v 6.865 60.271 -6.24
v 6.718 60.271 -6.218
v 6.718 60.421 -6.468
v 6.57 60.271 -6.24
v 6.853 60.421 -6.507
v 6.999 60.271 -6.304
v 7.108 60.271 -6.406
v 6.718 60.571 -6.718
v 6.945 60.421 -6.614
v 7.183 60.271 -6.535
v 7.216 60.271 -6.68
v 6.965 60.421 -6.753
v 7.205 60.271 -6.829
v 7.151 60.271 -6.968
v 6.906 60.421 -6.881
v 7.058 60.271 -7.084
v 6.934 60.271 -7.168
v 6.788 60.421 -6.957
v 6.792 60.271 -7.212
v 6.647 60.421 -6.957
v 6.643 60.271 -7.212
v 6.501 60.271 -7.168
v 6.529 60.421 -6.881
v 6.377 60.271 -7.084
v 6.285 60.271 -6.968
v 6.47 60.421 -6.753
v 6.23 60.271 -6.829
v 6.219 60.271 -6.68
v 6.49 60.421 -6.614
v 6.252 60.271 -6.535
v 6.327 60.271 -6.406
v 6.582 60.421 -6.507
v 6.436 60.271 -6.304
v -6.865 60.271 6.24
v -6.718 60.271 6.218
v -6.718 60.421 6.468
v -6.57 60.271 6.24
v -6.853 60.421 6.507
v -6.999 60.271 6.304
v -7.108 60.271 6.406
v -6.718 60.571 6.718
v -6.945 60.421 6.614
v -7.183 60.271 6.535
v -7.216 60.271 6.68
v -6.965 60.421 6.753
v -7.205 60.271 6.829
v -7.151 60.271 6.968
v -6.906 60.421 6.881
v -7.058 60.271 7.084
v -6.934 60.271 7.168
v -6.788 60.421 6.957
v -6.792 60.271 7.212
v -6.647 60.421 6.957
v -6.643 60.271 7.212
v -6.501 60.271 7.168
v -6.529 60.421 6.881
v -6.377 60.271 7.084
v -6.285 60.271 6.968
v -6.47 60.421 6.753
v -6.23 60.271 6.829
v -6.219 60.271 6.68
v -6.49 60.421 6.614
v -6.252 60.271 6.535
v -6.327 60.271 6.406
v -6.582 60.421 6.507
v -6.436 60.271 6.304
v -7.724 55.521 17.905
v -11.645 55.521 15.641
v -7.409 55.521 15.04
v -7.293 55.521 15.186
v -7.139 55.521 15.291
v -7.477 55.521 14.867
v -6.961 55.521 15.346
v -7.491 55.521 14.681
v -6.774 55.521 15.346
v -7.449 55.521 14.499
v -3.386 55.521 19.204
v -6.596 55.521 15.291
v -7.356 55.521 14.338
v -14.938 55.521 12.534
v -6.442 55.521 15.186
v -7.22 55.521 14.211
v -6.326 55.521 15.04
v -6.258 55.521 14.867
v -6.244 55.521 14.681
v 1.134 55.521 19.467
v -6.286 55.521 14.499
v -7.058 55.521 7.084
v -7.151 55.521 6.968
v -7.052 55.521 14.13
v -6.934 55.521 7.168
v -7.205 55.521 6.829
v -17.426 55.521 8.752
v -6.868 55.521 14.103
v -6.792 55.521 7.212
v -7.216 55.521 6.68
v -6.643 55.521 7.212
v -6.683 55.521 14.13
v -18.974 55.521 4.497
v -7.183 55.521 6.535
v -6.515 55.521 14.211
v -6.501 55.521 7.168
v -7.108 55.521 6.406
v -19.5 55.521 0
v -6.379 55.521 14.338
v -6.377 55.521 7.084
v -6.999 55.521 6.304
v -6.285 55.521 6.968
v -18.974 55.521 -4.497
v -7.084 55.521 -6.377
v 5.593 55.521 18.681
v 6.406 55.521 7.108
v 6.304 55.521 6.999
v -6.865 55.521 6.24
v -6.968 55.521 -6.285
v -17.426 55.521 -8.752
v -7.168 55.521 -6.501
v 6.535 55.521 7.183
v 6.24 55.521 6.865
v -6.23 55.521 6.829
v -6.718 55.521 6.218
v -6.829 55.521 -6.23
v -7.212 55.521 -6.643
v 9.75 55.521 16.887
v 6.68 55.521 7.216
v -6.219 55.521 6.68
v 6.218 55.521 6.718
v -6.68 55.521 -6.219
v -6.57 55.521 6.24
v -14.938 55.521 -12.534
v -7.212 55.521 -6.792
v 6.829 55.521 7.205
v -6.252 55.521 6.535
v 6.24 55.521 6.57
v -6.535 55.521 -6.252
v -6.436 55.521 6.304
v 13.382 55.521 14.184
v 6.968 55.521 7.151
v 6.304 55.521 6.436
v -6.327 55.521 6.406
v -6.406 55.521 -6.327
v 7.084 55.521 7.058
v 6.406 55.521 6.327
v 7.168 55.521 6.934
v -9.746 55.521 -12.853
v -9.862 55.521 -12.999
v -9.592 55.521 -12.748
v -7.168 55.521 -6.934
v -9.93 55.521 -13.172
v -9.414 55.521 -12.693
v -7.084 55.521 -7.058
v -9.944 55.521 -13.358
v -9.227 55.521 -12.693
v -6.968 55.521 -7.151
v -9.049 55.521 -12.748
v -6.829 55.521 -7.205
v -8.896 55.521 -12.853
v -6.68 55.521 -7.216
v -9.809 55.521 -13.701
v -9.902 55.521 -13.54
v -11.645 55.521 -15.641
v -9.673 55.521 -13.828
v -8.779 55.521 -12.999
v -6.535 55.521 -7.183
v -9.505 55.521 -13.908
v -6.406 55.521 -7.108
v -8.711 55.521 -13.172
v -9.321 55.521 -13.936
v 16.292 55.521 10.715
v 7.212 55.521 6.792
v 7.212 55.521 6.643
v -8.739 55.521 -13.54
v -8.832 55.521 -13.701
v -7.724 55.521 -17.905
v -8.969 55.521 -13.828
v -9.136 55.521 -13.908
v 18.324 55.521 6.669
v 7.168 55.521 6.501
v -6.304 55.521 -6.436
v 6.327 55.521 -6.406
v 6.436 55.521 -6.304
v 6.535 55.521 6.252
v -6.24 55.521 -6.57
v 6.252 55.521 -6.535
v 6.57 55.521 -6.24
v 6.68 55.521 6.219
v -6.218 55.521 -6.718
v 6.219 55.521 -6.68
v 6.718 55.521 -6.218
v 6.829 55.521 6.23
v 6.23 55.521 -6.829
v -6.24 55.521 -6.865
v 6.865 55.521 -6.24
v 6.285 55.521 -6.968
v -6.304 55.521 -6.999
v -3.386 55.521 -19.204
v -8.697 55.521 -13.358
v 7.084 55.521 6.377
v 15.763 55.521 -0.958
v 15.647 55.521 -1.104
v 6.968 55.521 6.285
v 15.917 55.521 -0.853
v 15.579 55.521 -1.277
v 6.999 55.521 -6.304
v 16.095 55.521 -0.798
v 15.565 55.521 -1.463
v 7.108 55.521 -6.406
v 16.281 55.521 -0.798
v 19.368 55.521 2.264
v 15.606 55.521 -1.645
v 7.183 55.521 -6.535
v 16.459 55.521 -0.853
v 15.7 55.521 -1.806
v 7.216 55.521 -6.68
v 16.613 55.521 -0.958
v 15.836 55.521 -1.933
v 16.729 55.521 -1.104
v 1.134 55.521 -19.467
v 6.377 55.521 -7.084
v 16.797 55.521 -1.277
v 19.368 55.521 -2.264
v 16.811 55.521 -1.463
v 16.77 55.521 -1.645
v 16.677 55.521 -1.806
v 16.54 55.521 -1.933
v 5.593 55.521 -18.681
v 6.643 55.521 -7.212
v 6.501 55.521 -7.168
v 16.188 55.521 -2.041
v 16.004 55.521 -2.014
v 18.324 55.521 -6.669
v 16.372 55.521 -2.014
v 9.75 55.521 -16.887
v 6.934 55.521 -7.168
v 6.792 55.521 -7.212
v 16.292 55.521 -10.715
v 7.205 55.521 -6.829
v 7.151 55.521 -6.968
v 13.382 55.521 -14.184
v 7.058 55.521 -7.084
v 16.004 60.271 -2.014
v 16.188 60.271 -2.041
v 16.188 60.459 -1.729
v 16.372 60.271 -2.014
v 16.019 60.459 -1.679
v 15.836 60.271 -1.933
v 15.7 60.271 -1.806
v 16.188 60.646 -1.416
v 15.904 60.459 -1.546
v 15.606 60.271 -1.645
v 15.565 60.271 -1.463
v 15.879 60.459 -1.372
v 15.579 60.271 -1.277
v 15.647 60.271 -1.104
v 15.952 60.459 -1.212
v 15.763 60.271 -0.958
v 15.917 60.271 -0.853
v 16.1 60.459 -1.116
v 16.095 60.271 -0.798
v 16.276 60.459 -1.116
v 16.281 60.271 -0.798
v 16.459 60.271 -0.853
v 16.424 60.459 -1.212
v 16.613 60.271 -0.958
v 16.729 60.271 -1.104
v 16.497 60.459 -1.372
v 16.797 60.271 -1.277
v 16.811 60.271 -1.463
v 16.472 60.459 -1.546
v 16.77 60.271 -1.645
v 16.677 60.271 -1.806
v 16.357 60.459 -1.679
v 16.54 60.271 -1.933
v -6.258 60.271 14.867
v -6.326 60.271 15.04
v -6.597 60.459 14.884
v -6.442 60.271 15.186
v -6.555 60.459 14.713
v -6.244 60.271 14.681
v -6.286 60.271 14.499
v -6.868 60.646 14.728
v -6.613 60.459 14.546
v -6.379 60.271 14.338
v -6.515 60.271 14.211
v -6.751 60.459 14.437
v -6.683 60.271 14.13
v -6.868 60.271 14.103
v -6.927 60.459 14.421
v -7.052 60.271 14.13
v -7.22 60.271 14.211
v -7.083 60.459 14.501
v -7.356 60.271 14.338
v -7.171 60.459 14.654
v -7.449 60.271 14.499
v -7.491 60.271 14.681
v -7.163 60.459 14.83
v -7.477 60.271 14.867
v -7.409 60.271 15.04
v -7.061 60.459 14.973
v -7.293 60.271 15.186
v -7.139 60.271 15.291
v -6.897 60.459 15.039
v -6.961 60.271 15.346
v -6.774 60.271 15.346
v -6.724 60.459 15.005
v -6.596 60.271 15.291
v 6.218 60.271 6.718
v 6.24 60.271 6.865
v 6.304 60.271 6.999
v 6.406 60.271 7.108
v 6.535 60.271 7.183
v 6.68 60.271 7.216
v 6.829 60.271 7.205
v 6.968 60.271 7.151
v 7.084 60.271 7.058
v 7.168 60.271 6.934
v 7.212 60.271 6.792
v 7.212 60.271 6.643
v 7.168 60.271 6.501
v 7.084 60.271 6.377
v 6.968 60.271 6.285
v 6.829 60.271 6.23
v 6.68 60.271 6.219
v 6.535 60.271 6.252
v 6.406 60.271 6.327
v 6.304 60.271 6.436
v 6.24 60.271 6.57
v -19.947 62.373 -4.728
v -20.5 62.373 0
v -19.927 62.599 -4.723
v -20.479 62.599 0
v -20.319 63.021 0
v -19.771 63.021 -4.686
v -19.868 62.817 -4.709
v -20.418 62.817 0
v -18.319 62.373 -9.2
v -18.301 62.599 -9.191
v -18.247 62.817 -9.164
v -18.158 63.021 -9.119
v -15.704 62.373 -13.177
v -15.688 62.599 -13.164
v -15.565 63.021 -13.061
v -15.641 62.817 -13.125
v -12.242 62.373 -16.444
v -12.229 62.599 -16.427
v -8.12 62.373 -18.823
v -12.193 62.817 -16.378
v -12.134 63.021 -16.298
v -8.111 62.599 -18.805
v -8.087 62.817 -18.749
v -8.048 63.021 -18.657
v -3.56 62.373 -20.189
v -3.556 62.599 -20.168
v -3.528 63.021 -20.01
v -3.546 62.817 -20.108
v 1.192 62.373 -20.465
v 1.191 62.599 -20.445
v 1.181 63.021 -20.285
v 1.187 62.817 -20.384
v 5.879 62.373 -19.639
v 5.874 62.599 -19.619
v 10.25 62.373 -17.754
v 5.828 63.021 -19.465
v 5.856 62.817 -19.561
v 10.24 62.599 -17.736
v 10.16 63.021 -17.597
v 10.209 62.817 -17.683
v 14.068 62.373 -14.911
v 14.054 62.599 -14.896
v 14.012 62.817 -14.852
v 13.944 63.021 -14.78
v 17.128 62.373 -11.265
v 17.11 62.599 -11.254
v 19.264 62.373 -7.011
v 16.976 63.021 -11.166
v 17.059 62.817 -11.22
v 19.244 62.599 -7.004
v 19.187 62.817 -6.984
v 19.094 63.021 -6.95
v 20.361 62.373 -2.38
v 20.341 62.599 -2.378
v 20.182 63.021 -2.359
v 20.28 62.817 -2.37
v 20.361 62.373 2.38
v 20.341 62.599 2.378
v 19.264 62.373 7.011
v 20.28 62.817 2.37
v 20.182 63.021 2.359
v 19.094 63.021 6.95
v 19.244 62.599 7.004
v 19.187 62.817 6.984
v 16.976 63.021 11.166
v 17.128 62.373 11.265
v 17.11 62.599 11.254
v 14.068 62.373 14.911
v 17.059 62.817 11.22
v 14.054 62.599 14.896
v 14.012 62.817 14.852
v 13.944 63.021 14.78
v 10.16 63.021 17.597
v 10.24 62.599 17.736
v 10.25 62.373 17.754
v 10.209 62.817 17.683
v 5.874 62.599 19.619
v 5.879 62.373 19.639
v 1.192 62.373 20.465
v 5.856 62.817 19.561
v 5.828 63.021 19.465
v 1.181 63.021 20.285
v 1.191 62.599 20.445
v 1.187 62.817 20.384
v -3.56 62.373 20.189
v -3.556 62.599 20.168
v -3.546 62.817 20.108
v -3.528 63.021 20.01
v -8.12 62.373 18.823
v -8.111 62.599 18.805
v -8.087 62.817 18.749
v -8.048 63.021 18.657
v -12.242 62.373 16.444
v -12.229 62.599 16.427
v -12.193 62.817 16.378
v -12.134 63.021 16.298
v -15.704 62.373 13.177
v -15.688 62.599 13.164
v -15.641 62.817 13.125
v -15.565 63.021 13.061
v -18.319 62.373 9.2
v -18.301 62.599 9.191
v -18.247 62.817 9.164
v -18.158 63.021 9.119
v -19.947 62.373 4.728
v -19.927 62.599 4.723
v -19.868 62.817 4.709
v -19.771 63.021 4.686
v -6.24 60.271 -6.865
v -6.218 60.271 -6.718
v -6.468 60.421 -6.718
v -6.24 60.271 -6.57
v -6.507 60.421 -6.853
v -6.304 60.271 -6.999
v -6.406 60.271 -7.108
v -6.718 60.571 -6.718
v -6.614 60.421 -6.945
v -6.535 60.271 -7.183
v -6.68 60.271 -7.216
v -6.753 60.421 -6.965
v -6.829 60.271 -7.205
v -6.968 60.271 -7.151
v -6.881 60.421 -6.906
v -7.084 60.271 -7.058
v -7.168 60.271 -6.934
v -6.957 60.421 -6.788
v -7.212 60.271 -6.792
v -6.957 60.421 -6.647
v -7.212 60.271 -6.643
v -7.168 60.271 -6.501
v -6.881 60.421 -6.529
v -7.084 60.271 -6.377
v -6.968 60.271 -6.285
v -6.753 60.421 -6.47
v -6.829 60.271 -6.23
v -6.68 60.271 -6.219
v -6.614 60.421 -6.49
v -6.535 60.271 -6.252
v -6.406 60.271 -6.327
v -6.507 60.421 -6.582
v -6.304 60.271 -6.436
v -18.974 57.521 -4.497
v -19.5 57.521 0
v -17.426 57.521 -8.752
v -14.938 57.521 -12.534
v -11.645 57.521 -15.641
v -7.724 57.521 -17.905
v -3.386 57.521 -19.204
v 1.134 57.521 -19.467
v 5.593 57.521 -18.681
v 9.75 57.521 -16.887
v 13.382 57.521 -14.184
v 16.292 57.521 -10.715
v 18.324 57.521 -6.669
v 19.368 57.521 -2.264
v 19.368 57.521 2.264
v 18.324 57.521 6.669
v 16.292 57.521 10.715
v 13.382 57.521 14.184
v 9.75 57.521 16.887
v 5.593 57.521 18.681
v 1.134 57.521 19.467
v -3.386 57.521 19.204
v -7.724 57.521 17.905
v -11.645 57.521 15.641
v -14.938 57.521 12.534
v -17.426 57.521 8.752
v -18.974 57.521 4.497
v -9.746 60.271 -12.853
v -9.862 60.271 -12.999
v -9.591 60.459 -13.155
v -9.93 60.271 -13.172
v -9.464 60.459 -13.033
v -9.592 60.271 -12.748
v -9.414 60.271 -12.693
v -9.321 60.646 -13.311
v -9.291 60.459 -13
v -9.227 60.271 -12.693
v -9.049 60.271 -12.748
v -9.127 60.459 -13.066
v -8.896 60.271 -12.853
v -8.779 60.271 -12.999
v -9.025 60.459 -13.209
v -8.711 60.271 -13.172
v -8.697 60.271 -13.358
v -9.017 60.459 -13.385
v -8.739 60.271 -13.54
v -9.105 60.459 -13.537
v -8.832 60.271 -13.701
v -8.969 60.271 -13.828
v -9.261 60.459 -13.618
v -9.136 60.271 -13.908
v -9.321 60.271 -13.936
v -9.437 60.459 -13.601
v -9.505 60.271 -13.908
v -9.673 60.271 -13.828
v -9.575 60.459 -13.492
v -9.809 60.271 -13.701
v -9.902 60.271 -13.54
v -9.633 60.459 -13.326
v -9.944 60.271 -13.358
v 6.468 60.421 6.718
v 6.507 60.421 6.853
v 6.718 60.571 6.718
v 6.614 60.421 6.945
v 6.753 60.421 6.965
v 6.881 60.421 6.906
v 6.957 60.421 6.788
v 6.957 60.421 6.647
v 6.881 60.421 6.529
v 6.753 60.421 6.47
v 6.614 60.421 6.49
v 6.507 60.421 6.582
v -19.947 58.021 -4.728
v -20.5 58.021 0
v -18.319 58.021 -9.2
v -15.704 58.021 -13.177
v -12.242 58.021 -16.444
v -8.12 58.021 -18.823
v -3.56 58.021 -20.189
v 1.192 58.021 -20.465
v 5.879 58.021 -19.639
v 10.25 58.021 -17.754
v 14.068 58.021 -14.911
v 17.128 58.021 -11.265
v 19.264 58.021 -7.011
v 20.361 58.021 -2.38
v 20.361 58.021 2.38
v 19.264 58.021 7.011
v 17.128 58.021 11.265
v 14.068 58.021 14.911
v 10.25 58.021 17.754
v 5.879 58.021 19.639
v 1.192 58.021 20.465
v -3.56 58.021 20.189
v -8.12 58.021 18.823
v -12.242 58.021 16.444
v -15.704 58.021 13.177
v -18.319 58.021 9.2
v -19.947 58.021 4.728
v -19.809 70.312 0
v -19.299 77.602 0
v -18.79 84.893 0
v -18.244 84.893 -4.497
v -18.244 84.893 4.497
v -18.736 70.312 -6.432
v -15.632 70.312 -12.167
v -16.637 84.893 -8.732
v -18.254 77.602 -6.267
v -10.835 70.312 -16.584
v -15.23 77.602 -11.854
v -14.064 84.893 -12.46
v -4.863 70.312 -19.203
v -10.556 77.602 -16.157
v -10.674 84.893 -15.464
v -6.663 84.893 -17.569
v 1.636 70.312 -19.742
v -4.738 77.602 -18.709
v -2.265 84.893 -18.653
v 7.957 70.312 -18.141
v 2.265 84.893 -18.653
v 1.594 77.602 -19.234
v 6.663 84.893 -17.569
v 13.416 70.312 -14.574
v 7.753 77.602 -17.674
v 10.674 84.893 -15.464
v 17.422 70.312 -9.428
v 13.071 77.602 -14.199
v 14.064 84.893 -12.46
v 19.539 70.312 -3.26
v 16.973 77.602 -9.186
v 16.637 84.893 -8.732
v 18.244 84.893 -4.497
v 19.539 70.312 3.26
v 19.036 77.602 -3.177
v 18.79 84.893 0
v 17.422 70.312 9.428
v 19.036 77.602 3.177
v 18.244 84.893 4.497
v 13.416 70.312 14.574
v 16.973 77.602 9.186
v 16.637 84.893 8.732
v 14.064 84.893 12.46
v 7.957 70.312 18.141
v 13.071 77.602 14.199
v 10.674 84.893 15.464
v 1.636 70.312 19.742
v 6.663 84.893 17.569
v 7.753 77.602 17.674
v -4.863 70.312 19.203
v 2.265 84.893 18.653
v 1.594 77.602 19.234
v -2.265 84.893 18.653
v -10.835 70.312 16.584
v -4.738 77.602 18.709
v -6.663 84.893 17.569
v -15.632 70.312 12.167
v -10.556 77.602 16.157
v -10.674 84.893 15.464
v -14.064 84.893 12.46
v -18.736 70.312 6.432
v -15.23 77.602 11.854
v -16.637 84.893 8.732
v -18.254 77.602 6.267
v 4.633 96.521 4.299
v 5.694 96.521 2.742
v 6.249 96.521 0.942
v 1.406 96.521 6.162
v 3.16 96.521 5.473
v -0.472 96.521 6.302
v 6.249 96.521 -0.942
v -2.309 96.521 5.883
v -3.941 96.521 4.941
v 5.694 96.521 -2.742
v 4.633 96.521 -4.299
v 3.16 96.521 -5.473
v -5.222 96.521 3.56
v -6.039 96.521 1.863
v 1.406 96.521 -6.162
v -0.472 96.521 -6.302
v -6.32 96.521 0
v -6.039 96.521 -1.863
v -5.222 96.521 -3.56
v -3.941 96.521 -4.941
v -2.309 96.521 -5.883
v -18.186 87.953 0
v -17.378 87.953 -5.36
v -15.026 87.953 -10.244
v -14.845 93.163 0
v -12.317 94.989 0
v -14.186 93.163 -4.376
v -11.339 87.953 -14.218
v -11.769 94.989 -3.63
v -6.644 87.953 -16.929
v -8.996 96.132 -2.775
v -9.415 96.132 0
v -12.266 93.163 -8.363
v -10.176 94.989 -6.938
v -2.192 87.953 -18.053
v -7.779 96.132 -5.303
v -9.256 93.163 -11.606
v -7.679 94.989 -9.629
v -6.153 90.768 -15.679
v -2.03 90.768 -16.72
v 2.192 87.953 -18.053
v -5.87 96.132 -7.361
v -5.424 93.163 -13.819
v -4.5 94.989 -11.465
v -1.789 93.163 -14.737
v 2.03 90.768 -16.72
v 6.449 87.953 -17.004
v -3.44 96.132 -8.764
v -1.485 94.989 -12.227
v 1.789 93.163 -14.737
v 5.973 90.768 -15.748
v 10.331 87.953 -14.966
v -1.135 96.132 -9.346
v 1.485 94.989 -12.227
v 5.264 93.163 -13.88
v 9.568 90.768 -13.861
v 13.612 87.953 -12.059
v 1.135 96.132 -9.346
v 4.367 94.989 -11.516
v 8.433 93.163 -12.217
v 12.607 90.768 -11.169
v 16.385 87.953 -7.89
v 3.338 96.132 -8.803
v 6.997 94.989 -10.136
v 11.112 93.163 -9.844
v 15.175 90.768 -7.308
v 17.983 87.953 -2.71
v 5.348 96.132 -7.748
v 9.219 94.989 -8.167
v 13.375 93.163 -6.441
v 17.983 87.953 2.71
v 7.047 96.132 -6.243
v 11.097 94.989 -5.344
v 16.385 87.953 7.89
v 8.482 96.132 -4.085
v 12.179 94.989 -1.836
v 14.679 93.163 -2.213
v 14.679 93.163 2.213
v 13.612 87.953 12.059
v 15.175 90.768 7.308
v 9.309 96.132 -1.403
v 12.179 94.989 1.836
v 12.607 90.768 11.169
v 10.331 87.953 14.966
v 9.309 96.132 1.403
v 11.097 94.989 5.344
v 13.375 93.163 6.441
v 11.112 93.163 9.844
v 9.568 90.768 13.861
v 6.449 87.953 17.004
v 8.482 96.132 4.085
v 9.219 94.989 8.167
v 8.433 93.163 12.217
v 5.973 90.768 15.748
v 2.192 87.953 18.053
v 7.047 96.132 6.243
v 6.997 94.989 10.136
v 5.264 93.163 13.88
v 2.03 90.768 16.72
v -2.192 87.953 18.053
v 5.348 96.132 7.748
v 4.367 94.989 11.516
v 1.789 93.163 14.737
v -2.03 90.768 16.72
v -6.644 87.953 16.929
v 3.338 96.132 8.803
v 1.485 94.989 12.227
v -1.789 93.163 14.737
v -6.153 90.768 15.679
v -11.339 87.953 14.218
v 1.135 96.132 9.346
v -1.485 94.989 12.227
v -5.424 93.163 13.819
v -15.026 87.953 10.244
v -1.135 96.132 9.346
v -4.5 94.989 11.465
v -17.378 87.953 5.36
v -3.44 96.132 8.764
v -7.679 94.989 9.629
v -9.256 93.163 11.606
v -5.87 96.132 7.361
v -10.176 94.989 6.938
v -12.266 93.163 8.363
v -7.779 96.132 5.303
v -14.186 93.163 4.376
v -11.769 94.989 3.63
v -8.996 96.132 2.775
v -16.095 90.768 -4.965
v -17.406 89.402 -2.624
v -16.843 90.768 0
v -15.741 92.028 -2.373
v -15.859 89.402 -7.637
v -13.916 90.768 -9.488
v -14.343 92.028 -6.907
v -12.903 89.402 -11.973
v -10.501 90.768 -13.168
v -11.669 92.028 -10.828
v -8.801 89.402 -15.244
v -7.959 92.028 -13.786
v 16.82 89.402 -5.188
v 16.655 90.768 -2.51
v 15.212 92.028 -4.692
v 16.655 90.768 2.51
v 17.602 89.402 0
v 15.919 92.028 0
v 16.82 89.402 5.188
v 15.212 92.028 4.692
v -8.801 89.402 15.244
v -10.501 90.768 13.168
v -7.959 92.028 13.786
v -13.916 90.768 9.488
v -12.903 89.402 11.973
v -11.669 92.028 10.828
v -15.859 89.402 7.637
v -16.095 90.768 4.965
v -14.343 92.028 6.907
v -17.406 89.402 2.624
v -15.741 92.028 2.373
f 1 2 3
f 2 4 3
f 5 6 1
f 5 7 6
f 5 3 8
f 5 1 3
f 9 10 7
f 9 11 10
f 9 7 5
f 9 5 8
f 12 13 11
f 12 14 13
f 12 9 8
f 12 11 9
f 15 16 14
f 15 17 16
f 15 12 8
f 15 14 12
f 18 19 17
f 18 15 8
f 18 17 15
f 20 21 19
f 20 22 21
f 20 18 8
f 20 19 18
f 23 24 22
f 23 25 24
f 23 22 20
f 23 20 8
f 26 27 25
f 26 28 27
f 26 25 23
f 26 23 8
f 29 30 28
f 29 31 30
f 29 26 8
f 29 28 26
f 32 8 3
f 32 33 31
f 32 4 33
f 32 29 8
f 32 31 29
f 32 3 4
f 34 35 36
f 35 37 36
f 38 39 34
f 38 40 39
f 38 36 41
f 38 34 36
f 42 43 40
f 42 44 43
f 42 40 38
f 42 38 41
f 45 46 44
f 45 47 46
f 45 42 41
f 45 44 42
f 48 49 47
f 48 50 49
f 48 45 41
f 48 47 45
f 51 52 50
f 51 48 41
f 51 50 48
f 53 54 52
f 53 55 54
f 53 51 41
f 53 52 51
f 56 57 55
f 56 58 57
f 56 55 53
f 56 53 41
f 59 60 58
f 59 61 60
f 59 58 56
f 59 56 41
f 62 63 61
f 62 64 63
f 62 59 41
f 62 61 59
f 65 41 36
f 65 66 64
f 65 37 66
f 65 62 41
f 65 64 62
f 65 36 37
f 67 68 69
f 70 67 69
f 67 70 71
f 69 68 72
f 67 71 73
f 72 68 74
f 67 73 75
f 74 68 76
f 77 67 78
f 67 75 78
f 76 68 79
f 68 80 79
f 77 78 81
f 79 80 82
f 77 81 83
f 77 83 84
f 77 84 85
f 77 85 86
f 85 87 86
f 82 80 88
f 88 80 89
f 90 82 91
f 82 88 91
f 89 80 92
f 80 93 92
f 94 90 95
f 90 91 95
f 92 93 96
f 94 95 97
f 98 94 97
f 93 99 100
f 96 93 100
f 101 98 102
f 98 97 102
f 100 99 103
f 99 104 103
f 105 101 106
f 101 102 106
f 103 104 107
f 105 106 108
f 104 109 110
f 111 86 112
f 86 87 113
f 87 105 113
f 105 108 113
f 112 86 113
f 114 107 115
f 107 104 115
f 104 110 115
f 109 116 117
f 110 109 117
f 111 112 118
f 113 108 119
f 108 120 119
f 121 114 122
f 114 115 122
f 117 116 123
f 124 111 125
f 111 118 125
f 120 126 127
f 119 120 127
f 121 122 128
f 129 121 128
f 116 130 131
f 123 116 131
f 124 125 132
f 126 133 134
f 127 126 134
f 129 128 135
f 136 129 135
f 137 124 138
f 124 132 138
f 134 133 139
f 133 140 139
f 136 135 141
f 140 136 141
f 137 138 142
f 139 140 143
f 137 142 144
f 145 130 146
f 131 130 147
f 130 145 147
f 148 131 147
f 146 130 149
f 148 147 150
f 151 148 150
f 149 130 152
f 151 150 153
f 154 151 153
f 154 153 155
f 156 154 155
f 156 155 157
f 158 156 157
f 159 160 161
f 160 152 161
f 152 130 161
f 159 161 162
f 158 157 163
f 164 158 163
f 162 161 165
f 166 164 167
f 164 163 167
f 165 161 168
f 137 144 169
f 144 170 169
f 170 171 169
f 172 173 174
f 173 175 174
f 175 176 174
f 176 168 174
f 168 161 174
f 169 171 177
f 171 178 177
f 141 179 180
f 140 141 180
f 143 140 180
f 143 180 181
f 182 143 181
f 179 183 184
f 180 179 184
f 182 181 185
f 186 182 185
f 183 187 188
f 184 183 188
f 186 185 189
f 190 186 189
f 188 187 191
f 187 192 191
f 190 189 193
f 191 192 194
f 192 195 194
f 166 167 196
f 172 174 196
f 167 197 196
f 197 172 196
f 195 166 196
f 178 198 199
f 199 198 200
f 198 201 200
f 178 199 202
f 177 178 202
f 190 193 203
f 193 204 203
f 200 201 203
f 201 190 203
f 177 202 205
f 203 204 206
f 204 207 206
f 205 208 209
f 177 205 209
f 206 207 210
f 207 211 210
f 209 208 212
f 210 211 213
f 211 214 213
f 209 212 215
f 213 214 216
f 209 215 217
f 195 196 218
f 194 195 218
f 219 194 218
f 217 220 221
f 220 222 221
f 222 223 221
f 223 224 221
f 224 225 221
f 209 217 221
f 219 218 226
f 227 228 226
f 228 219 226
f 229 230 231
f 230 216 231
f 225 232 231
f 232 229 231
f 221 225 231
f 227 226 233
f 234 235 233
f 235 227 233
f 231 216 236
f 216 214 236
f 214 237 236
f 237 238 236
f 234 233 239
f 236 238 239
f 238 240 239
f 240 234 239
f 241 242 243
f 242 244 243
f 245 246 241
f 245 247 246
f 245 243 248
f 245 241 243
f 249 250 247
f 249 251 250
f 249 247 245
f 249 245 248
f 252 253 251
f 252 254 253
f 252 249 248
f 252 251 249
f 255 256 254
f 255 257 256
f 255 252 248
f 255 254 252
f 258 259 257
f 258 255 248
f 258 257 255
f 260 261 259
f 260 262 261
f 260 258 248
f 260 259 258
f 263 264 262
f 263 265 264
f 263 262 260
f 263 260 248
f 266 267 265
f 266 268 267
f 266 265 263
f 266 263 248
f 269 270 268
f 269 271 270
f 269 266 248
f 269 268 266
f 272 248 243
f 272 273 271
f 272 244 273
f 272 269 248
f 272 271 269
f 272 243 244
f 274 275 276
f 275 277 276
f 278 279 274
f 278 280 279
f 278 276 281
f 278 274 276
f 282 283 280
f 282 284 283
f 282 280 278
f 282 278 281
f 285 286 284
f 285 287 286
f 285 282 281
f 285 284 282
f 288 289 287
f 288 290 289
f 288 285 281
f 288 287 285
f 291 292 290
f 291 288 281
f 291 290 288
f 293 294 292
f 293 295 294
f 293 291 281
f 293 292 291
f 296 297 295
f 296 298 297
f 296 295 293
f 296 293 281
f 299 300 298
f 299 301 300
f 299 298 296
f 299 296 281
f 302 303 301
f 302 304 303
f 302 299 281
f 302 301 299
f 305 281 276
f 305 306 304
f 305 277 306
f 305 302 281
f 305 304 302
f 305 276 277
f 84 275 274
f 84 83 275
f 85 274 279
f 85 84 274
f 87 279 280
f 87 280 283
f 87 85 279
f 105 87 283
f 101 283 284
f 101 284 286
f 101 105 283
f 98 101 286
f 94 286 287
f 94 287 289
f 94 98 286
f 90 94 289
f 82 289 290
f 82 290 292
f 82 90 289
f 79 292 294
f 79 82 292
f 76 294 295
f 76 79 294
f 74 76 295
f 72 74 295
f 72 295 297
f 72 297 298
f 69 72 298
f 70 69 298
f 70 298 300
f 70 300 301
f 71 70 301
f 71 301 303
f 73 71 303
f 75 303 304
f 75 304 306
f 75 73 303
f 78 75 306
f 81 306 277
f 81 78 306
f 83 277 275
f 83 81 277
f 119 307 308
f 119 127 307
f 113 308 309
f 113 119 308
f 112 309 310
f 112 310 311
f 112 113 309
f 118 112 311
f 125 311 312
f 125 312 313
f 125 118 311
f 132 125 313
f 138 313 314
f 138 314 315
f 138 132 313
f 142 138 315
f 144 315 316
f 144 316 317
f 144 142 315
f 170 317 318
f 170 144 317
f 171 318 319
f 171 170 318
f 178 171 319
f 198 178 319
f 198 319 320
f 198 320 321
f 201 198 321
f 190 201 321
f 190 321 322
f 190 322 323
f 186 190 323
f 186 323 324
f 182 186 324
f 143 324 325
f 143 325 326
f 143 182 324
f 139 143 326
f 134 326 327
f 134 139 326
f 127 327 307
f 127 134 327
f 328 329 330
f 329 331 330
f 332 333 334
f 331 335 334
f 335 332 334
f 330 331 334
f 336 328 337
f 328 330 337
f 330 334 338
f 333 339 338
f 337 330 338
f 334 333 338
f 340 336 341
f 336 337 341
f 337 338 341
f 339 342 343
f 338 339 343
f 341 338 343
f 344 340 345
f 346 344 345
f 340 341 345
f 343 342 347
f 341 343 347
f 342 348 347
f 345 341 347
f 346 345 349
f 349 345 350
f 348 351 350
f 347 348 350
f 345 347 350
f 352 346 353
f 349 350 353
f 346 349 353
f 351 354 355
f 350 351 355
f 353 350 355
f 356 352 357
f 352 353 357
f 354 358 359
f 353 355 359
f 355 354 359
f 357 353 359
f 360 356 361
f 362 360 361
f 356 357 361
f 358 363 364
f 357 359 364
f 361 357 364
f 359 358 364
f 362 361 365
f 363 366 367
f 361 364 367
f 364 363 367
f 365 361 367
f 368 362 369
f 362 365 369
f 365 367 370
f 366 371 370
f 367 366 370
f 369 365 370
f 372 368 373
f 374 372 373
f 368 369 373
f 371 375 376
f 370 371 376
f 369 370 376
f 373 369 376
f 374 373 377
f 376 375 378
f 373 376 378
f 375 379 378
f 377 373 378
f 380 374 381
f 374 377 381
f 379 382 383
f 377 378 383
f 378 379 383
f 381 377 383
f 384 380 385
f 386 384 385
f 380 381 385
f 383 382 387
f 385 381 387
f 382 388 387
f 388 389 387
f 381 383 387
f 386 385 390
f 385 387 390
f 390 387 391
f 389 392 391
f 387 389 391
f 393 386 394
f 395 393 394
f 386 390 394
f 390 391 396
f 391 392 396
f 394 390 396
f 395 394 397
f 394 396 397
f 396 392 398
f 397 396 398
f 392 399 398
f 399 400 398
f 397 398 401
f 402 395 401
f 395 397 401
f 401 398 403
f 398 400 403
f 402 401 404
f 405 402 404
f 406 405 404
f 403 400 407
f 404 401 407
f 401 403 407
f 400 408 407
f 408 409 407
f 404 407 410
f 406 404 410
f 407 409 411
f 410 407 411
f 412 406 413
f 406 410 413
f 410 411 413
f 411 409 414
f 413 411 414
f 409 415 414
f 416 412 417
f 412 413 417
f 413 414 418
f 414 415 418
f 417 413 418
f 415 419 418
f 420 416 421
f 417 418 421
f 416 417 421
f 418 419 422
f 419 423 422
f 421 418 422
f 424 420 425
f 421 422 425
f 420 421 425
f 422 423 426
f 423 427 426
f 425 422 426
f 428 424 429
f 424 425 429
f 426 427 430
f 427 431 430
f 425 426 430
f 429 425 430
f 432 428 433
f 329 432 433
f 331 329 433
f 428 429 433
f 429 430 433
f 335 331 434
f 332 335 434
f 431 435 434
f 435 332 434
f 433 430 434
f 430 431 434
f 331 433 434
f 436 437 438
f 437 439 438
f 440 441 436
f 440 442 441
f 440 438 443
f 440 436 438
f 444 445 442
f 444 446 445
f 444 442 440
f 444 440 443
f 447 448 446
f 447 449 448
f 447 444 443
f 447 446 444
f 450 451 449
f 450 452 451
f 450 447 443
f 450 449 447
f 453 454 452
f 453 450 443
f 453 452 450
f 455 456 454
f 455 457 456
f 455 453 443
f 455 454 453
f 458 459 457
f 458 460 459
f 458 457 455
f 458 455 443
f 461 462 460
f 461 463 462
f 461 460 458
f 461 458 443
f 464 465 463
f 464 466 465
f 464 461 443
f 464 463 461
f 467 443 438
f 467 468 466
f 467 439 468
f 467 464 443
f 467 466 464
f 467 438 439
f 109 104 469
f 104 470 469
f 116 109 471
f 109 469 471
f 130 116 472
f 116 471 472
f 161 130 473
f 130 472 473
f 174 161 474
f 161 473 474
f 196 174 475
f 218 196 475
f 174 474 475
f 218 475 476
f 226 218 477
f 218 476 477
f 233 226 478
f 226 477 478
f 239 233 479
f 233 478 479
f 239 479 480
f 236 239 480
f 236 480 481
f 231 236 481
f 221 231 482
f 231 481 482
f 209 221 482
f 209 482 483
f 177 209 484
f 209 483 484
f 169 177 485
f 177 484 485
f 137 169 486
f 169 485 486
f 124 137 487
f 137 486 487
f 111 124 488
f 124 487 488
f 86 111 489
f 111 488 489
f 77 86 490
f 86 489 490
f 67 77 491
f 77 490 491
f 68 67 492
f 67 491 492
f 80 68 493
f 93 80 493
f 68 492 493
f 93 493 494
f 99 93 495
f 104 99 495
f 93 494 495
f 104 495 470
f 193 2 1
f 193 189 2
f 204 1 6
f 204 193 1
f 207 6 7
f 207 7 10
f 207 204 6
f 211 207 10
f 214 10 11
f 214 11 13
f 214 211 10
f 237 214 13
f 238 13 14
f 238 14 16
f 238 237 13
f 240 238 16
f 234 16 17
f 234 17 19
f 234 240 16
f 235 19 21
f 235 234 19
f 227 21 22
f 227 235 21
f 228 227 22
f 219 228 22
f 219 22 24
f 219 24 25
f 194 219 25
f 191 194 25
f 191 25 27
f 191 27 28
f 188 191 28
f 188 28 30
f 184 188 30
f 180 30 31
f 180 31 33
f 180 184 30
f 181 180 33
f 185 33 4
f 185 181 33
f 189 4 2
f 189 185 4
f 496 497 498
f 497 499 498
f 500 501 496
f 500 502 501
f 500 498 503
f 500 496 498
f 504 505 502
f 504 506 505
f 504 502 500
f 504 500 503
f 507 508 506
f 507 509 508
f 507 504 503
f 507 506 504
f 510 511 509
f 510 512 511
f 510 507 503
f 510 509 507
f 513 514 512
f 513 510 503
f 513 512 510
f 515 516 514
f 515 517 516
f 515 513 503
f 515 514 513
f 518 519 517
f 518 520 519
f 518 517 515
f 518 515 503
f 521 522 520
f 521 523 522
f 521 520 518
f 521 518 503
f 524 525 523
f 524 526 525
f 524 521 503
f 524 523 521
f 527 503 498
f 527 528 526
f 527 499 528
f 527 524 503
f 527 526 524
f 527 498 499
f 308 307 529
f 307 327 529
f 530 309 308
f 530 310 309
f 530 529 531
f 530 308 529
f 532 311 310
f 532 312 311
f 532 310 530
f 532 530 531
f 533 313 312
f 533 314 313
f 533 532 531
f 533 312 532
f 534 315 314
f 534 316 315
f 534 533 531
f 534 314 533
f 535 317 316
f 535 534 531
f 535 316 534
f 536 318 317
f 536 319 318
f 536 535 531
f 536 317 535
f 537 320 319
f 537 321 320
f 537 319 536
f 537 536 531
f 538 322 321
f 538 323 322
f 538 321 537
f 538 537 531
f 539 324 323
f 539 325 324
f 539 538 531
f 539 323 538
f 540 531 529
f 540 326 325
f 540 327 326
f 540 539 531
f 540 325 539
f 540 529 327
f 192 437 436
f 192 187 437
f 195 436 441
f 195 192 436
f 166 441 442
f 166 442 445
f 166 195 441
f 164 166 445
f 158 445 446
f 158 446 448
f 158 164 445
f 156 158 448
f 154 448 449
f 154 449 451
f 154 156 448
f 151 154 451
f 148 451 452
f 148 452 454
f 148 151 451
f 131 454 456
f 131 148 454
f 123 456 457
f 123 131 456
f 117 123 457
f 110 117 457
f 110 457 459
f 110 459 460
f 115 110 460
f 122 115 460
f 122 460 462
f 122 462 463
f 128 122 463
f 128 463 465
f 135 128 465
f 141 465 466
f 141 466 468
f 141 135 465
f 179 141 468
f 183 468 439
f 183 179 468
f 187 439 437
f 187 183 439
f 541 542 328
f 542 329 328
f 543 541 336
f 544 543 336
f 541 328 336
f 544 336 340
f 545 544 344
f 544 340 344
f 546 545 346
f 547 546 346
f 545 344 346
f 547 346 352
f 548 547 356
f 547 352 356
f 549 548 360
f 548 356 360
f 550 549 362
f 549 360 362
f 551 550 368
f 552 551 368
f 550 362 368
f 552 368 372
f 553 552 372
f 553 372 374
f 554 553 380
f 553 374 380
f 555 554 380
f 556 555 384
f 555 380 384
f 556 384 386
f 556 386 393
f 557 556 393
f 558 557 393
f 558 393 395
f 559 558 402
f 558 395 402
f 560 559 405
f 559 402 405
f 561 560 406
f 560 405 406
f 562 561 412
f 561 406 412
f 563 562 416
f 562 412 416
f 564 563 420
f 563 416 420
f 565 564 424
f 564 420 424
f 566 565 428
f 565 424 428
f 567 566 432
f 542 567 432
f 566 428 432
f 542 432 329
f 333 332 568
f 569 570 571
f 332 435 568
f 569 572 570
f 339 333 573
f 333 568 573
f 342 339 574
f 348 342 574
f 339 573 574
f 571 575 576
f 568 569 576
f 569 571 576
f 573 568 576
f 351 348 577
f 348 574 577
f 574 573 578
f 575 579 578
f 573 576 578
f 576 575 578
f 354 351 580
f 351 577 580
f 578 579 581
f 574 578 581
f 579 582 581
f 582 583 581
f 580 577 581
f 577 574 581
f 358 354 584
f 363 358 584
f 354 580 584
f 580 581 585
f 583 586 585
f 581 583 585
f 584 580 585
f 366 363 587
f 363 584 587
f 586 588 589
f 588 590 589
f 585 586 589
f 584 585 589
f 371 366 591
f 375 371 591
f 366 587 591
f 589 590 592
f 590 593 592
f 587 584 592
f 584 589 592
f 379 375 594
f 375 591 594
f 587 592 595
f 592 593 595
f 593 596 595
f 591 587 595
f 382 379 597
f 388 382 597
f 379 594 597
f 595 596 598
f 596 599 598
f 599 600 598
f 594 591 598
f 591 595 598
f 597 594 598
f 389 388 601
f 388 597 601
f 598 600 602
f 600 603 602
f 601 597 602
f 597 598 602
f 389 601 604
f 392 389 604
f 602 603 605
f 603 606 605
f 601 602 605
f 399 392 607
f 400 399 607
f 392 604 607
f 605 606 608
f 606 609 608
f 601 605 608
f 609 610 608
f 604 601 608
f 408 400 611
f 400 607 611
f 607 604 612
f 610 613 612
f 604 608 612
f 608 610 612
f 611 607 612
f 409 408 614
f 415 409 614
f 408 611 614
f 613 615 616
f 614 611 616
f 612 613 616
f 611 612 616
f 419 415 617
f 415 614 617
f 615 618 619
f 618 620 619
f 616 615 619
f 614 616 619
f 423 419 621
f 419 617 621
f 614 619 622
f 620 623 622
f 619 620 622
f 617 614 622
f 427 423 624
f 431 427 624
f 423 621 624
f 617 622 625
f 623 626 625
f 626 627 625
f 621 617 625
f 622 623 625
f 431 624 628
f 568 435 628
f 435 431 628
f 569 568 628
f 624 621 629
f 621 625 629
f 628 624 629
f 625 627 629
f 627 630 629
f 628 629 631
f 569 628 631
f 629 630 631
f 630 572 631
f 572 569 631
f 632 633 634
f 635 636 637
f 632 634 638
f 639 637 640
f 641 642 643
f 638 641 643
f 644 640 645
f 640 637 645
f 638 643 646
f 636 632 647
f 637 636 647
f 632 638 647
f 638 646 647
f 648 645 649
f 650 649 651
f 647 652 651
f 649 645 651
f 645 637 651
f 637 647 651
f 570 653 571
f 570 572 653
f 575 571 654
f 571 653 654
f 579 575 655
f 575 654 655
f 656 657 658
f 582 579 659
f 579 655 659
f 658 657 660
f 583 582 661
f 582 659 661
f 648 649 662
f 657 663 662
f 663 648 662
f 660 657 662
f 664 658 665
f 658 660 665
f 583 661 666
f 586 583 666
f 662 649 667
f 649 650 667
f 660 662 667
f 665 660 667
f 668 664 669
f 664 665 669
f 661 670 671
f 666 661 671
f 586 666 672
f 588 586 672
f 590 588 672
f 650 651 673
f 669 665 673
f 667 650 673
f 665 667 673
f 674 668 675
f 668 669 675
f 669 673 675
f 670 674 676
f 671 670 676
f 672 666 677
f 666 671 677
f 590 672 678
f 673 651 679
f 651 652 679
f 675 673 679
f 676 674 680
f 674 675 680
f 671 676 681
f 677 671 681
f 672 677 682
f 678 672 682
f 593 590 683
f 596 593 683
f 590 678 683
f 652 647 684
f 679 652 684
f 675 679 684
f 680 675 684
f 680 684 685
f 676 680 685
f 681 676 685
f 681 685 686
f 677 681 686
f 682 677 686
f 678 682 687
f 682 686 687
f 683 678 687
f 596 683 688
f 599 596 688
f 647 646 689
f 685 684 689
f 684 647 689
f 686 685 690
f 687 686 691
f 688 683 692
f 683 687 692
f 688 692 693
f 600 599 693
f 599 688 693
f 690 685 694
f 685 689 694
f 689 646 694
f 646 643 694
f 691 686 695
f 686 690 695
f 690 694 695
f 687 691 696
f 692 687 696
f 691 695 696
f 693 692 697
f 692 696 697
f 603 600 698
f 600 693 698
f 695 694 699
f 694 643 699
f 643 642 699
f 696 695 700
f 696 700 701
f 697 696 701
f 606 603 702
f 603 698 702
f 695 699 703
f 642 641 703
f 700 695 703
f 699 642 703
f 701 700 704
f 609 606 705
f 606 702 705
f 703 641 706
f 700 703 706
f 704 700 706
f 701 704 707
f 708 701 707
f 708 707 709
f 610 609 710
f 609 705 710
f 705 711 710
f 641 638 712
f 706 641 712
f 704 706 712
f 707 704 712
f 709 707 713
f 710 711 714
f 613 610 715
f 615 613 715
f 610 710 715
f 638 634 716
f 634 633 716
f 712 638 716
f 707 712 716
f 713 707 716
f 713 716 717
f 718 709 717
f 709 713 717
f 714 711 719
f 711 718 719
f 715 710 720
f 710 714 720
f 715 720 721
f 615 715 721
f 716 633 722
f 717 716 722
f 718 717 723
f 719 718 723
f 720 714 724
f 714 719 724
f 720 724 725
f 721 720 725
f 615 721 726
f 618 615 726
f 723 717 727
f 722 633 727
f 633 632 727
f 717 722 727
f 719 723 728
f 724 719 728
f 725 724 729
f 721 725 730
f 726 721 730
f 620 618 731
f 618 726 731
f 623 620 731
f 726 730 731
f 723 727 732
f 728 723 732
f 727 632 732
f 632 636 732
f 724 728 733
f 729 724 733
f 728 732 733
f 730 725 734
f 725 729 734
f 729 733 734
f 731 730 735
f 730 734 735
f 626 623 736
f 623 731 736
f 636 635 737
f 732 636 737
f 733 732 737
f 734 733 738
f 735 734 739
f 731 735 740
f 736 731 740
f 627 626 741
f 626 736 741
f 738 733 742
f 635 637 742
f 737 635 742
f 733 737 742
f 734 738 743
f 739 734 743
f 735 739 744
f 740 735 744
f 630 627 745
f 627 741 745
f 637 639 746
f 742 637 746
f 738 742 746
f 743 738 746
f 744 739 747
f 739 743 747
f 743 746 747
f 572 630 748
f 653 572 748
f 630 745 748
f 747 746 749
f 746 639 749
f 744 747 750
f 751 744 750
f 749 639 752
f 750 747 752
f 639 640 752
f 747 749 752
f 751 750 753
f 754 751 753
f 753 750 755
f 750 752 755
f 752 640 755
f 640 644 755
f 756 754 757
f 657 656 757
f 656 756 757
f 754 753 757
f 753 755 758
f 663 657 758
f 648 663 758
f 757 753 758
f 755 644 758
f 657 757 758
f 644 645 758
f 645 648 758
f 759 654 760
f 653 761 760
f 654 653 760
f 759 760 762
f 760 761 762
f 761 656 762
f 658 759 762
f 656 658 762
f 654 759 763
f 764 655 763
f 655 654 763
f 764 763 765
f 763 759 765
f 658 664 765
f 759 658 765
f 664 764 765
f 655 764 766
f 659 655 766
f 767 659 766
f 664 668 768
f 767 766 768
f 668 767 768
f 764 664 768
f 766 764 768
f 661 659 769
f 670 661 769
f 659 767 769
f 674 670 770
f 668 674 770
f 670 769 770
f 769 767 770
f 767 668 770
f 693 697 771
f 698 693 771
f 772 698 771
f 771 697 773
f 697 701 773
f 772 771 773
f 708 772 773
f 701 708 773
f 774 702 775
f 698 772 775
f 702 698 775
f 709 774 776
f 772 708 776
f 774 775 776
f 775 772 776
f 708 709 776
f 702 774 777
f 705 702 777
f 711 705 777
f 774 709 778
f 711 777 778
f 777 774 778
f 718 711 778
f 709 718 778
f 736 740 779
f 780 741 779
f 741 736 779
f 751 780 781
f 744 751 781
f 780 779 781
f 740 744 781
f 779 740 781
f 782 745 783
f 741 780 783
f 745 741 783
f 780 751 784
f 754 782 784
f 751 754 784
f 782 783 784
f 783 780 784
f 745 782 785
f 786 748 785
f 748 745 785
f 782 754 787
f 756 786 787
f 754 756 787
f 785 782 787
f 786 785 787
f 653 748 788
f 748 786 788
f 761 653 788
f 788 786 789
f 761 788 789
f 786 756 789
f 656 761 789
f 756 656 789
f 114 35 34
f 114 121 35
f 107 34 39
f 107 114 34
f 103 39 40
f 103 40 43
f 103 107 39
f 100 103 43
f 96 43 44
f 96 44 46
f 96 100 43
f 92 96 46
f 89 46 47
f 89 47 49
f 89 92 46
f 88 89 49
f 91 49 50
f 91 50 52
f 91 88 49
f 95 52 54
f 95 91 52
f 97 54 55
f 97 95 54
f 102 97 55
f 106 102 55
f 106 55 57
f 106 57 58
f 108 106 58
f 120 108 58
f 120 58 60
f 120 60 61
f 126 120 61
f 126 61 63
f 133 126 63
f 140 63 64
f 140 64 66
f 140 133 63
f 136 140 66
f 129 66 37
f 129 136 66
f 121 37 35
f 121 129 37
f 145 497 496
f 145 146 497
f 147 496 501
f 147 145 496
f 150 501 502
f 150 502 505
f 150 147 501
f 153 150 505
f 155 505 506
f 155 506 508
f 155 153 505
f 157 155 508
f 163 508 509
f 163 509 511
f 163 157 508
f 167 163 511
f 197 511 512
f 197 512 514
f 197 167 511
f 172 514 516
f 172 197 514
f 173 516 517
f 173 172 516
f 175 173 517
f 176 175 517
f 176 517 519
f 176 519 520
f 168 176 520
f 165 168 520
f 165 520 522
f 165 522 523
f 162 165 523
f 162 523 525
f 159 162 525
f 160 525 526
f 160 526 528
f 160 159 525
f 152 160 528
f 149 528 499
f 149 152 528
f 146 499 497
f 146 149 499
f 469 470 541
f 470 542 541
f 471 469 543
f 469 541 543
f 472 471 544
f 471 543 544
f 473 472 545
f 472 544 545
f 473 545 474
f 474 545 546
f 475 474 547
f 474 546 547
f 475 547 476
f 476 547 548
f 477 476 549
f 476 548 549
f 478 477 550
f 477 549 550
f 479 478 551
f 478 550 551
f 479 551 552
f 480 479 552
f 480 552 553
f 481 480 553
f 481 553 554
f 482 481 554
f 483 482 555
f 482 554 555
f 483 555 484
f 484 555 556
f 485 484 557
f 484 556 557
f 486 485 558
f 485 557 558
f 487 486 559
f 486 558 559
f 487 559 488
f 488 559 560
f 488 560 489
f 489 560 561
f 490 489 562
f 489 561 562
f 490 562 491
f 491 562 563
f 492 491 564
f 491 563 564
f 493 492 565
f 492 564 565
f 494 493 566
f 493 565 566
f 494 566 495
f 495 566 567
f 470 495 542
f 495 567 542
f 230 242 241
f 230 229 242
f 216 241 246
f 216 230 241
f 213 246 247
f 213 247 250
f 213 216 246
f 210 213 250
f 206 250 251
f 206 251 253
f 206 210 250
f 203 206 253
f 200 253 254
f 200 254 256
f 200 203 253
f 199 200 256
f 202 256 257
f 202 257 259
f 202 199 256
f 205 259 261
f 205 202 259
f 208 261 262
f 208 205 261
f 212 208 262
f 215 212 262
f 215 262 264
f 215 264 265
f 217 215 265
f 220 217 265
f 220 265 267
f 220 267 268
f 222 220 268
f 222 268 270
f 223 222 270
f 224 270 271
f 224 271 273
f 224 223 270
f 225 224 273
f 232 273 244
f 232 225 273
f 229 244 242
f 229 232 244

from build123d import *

# Parameters (mm, degrees)
CIRPATTERN1_COUNT = 4
CIRPATTERN2_COUNT = 3
SCALE2_SCALE      = 0.5
SCALE3_SCALE      = 0.5


with BuildPart() as part:
    # Sketch1 → Revolve1 (revolve)
    with BuildSketch(Plane.XY):
        with BuildLine():
            Line((0, 0), (-78, 0))
            Line((-78, 0), (-78, 8))
            Line((-78, 8), (-82, 10))
            Line((-82, 10), (-82, 27.409008705))
            ThreePointArc((-82, 27.409008705), (-81.815678203, 28.754089909), (-81.276302621, 30))
            Line((-81.276302621, 30), (-75.158558027, 117.487823687))
            ThreePointArc((-75.158558027, 117.487823687), (-59.380273517, 150.567685081), (-25.280355514, 164))
            Line((-25.280355514, 164), (0, 164))
            Line((0, 164), (0, 0))
        make_face()
    revolve(axis=Axis((0, 164, 0), (0, -1, 0)))

    # Sketch5 → Ø4.0 (4) Diameter Hole1 (revolve, cut)
    with BuildSketch(Plane(origin=(-26.870057685, 0, 26.870057685), x_dir=(0, 0, -1), z_dir=(1, 0, 0))):
        Polygon((0, 0), (0, 20.201721238), (2, 19), (2, 0), align=None)
    f_4_0_4_diameter_hole1 = revolve(axis=Axis((-26.870057685, -6.35, 26.870057685), (0, 1, 0)), mode=Mode.SUBTRACT)

    # CirPattern1: Ø4.0 (4) Diameter Hole1 ×4 about axis
    cirpattern1_axis = Axis((0, 0, 0), (0, 1, 0))
    for i in range(1, CIRPATTERN1_COUNT):
        add(f_4_0_4_diameter_hole1.rotate(cirpattern1_axis, i * 360 / CIRPATTERN1_COUNT), mode=Mode.SUBTRACT)

    # Sketch7 → Ø5.0 (5) Diameter Hole1 (revolve, cut)
    with BuildSketch(Plane(origin=(64.752655376, 0, -5.665123279), x_dir=(0, 0, -1), z_dir=(1, 0, 0))):
        Polygon((0, 0), (0, 20.502151548), (2.5, 19), (2.5, 0), align=None)
    f_5_0_5_diameter_hole1 = revolve(axis=Axis((64.752655376, -6.35, -5.665123279), (0, 1, 0)), mode=Mode.SUBTRACT)

    # CirPattern2: Ø5.0 (5) Diameter Hole1 ×3 about axis
    cirpattern2_axis = Axis((0, 0, 0), (0, 1, 0))
    for i in range(1, CIRPATTERN2_COUNT):
        add(f_5_0_5_diameter_hole1.rotate(cirpattern2_axis, i * 360 / CIRPATTERN2_COUNT), mode=Mode.SUBTRACT)


with BuildPart() as part_1:
    # Scale2: scaled about (0, 74.027875032, 0)
    add(part.part.scale(SCALE2_SCALE).moved(Location((0, 37.013937516, 0))))


with BuildPart() as part_2:
    # Scale3: scaled about (0, 74.027875032, 0)
    add(part_1.part.scale(SCALE3_SCALE).moved(Location((0, 37.013937516, 0))))


solid = part_2.part
